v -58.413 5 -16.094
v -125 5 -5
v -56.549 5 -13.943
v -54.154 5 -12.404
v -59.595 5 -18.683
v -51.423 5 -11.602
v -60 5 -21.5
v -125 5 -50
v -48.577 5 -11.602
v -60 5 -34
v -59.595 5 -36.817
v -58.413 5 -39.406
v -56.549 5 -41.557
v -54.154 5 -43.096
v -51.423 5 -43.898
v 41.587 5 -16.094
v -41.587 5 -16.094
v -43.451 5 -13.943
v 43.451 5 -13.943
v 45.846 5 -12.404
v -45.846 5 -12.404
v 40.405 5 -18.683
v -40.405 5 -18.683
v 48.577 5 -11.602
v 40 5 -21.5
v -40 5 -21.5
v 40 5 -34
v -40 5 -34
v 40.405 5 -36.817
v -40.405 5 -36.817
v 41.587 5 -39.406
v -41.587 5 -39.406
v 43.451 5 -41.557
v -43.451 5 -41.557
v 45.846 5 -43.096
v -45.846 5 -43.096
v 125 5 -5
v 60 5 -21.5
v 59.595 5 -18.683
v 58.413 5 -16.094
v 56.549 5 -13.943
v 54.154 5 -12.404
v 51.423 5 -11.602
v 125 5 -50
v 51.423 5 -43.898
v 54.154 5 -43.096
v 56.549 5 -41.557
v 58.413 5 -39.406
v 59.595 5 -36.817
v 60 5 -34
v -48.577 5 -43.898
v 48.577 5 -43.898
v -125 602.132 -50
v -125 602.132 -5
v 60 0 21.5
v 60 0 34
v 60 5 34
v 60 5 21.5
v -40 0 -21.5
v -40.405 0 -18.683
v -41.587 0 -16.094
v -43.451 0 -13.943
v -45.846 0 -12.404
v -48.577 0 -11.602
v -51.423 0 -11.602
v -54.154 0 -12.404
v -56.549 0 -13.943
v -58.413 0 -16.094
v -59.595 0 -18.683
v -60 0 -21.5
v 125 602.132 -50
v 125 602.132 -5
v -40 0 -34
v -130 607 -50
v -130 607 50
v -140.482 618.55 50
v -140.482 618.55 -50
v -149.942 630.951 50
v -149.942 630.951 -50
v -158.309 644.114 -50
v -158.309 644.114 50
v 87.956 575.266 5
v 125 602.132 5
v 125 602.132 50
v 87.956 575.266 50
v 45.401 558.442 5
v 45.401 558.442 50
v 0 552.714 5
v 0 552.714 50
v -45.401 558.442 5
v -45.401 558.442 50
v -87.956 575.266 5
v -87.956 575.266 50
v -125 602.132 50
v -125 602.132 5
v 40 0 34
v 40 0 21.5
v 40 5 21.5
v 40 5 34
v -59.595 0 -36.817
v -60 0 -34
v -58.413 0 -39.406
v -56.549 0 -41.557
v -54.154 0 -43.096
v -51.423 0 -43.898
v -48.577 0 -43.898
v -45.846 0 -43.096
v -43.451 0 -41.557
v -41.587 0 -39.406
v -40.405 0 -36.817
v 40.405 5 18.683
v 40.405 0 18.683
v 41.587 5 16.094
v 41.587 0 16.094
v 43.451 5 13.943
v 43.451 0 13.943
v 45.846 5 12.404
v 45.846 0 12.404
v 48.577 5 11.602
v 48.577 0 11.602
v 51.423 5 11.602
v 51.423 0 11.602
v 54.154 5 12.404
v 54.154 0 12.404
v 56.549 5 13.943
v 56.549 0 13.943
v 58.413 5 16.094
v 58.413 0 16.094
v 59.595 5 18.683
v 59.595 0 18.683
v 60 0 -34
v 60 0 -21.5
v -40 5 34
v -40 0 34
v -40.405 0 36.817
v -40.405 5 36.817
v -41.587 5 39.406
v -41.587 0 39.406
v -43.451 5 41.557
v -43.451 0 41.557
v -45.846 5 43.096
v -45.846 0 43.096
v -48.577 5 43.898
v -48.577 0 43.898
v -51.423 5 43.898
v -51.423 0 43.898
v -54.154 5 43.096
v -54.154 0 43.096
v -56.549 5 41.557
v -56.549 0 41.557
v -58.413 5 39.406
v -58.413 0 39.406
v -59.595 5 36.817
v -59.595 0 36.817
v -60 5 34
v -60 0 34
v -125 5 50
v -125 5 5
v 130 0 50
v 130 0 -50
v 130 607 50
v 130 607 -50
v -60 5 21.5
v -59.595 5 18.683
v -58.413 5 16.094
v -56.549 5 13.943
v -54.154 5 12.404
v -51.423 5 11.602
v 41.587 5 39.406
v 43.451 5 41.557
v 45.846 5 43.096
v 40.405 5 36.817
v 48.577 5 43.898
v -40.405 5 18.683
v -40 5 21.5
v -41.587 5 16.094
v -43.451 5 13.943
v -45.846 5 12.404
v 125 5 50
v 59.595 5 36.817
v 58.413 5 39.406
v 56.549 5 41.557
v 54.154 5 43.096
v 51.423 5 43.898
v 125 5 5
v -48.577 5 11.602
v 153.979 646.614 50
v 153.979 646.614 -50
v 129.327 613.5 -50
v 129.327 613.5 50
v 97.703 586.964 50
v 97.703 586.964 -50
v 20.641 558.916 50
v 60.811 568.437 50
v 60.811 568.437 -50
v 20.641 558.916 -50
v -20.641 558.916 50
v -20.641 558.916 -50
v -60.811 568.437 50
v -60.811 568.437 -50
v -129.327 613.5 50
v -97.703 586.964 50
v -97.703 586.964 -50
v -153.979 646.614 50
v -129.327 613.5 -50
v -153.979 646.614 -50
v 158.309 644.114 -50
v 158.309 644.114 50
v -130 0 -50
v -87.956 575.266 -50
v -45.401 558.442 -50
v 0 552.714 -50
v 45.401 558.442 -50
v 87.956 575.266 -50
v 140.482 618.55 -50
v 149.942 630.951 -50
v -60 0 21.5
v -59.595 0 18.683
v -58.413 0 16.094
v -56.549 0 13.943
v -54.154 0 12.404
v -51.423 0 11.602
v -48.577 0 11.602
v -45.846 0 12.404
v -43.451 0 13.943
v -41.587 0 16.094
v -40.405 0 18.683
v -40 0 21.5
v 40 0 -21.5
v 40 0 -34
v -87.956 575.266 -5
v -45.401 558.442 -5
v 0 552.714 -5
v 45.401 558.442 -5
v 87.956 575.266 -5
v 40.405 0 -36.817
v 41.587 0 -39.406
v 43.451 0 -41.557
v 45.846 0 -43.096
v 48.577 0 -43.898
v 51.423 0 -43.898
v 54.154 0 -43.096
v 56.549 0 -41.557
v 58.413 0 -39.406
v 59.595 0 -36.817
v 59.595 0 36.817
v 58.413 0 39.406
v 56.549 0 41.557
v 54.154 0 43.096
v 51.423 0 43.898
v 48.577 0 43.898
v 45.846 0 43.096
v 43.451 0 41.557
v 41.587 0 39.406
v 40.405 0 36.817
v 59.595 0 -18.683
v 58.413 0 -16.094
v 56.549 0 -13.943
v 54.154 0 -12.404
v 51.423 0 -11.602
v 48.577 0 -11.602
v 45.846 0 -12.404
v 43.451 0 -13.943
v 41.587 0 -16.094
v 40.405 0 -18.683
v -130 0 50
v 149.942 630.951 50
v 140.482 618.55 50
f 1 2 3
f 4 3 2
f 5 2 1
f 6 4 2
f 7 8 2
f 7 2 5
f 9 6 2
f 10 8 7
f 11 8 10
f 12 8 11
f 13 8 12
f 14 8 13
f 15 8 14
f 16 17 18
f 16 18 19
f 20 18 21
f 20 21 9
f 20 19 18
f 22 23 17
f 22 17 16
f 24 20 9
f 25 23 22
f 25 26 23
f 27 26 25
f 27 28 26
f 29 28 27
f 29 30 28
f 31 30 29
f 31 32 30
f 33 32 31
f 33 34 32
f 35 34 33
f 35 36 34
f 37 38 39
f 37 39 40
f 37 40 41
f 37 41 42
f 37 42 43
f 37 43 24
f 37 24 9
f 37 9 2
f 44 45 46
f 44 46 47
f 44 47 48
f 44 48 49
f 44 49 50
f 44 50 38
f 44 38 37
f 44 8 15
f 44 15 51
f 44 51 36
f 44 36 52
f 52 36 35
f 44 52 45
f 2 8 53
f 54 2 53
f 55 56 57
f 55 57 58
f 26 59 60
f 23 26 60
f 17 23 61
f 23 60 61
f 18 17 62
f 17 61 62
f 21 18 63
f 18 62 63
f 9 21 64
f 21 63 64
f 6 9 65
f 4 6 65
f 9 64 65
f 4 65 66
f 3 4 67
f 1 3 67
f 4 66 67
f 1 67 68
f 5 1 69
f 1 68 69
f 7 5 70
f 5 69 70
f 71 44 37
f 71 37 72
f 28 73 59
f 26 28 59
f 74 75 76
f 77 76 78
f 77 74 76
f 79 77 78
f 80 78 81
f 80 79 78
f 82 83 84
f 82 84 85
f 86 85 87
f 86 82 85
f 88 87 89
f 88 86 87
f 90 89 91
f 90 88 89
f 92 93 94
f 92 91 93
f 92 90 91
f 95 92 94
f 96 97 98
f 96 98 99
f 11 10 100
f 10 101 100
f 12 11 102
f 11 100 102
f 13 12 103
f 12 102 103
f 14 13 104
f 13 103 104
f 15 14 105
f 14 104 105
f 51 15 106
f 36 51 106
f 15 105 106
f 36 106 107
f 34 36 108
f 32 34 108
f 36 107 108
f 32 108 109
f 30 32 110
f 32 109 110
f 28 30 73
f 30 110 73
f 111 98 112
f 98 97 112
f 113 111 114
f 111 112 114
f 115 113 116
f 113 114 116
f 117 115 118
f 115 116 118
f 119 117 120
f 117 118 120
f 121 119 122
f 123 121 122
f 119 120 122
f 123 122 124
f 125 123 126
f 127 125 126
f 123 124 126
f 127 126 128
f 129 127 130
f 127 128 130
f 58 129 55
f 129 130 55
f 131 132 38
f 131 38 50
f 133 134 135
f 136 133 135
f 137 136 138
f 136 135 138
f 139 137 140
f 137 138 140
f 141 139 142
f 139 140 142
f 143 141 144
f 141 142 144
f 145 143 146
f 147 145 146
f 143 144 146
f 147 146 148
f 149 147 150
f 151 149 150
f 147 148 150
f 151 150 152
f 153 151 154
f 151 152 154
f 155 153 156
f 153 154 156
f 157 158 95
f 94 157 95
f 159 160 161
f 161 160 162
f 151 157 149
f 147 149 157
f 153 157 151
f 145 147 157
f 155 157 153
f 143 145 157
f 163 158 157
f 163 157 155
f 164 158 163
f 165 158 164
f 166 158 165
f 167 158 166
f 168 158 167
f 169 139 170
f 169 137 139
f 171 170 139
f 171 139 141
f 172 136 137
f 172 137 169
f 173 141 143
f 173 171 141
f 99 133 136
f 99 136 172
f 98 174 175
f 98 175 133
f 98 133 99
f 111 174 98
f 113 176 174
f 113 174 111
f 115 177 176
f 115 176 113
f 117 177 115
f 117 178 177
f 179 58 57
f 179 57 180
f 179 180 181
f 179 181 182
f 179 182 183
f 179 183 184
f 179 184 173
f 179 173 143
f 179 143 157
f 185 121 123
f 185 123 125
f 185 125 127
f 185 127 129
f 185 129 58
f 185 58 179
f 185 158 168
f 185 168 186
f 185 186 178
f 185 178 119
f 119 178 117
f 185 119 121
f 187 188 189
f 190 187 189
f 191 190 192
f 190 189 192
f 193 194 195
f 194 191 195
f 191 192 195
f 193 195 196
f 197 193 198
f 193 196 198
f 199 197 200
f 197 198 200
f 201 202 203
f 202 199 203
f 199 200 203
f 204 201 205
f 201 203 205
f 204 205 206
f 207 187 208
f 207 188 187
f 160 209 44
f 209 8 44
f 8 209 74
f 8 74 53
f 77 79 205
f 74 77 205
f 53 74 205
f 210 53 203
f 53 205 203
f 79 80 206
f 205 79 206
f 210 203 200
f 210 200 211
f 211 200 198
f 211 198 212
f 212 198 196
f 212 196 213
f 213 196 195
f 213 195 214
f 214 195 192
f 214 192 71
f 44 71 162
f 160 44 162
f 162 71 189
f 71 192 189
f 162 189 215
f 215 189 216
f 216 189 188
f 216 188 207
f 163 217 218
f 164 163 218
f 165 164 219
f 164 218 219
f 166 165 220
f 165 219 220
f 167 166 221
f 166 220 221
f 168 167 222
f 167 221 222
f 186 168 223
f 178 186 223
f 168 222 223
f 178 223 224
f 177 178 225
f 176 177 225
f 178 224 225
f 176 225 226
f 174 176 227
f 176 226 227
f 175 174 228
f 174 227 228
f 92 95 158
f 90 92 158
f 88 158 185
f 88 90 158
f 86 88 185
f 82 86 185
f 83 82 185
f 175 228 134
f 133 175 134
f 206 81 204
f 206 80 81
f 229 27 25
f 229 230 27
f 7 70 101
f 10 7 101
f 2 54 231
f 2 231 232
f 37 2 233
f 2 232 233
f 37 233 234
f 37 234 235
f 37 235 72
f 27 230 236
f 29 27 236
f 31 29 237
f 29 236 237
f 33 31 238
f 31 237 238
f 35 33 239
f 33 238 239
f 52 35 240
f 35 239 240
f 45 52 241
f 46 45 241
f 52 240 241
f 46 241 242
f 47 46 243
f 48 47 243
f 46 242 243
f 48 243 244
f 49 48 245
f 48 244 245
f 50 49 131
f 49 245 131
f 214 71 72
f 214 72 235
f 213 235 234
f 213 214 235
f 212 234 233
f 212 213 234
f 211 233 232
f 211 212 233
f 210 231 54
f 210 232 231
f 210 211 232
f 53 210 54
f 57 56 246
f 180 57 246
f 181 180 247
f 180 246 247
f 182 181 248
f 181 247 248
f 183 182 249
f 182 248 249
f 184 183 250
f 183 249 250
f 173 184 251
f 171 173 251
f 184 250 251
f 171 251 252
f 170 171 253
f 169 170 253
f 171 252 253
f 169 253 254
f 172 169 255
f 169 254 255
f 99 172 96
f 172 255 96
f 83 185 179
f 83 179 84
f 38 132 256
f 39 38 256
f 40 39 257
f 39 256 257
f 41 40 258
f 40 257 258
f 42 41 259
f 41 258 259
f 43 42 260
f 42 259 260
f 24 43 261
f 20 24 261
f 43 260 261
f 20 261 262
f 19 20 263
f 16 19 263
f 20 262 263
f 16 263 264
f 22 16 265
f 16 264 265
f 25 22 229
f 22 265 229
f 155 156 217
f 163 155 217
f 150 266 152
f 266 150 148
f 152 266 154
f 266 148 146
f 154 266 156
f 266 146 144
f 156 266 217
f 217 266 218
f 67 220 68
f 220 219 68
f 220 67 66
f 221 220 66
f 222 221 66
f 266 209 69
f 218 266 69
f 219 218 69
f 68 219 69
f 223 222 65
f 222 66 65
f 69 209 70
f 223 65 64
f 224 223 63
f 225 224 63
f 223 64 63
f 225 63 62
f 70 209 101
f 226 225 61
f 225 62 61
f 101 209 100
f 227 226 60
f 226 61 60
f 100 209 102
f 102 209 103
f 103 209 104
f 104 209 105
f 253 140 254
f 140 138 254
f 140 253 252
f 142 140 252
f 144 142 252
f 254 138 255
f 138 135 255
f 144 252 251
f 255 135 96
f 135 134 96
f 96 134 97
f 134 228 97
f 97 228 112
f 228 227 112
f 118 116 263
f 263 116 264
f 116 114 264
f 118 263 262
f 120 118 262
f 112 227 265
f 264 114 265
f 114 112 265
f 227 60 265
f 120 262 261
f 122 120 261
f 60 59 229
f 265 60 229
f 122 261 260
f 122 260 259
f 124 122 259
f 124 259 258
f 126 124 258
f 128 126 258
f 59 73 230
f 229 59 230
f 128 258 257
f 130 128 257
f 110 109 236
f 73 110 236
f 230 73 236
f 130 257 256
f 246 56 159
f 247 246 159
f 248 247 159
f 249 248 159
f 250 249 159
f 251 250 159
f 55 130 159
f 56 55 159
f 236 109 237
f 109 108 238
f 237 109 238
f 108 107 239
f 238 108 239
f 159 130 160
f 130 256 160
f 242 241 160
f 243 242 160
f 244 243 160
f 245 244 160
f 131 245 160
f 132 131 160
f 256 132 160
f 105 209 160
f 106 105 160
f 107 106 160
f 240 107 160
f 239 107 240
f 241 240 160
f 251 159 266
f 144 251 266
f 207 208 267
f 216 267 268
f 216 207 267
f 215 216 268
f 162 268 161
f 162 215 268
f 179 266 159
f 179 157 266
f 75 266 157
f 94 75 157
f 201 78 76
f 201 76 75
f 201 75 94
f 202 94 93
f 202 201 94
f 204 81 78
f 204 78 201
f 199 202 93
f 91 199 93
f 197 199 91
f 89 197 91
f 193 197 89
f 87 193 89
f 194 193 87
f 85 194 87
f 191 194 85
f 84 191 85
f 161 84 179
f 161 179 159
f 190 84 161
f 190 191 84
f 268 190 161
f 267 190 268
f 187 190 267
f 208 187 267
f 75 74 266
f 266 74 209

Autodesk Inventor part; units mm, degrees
ref_plane "YZ Plane" through (0, 0, 0) normal (1, 0, 0) x (0, 1, 0)
ref_plane "XZ Plane" through (0, 0, 0) normal (0, 1, 0) x (-1, 0, 0)
ref_plane "XY Plane" through (0, 0, 0) normal (0, 0, 1) x (1, 0, 0)
sketch "Sketch1" plane through (0, 0, 0) normal (0, 0, 1) x (1, 0, 0)
  line L0 (-130, 607) -> (-130, 0)
  line L1 (-130, 0) -> (130, 0)
  line L2 (130, 0) -> (130, 607)
  line L3 (125, 5) -> (125, 602.1317)
  line L4 (-125, 5) -> (-125, 602.1317)
  line L5 (-125, 5) -> (125, 5)
  arc A0 (-153.9793, 646.614) -> (153.9793, 646.614) centre (0, 735.514) ccw
  arc A1 (130, 607) -> (158.3094, 644.114) centre (0, 735.514) ccw
  arc A2 (-158.3094, 644.114) -> (-130, 607) centre (0, 735.514) ccw
  arc A3 (-125, 602.1317) -> (125, 602.1317) centre (0, 735.514) ccw
  line L6 (-158.3094, 644.114) -> (-153.9793, 646.614)
  line L7 (153.9793, 646.614) -> (158.3094, 644.114)
  point P0 (0, 0)
  point P1 (0, 0)
  point P2 (0, 5)
  dimension "d0" = 260
  dimension "d2" = 607
  dimension "d3" = 607
  dimension "d6" = 5
  dimension "d7" = 5
  dimension "d8" = 5
  dimension "d57" = 355.6
  dimension "d61" = 5
  dimension "d64" = 182.8
  dimension "d79" = 130
  dimension "d80" = 120
  dimension "d81" = 158.3094
  dimension "d82" = 153.9793
  dimension "d83" = 153.9793
extrude "Extrusion1" add sketch "Sketch1" along normal mid plane 100
sketch "Sketch5" plane through (0, 0, 0) normal (0, 0, 1) x (1, 0, 0)
  line L0 (-125, 602.1317) -> (-125, 5) projected
  line L1 (-125, 602.1317) -> (-125, 5)
  line L2 (-125, 5) -> (125, 5)
  line L3 (-125, 5) -> (125, 5) projected
  line L4 (125, 5) -> (125, 602.1317) projected
  line L5 (125, 5) -> (125, 602.1317)
  arc A0 (-125, 602.1317) -> (125, 602.1317) centre (0, 735.514) ccw
  point P0 (0, 0)
  point P1 (0, 5)
  dimension "d67" = 365.6
extrude "Extrusion2" add sketch "Sketch5" along normal mid plane 10
sketch "Sketch6" plane through (-130, 0, 50) normal (0, -1, 0) x (1, 0, 0)
  line L0 (5, -100) -> (255, -100) projected
  line L1 (130, -100) -> (130, 0)
  line L2 (0, 0) -> (260, 0) projected
  line L3 (80, -16) -> (80, -28.5) construction
  line L4 (70, -16) -> (70, -28.5)
  line L5 (90, -28.5) -> (90, -16)
  arc A0 (90, -16) -> (70, -16) centre (80, -16) ccw
  arc A1 (70, -28.5) -> (90, -28.5) centre (80, -28.5) ccw
  line L6 (80, -71.5) -> (80, -84) construction
  line L7 (70, -71.5) -> (70, -84)
  line L8 (90, -84) -> (90, -71.5)
  arc A2 (90, -71.5) -> (70, -71.5) centre (80, -71.5) ccw
  arc A3 (70, -84) -> (90, -84) centre (80, -84) ccw
  line L9 (180, -16) -> (180, -28.5) construction
  line L10 (190, -16) -> (190, -28.5)
  line L11 (170, -28.5) -> (170, -16)
  arc A4 (190, -16) -> (170, -16) centre (180, -16) ccw
  arc A5 (170, -28.5) -> (190, -28.5) centre (180, -28.5) ccw
  line L12 (180, -71.5) -> (180, -84) construction
  line L13 (190, -71.5) -> (190, -84)
  line L14 (170, -84) -> (170, -71.5)
  arc A6 (190, -71.5) -> (170, -71.5) centre (180, -71.5) ccw
  arc A7 (170, -84) -> (190, -84) centre (180, -84) ccw
  point P0 (130, -50)
  point P1 (80, -22.25)
  point P2 (80, -77.75)
  point P3 (180, -22.25)
  point P4 (180, -77.75)
  dimension "d88" = 100
  dimension "d89" = 10
  dimension "d90" = 100
  dimension "d92" = 10
  dimension "d93" = 68
  dimension "d94" = 16
  dimension "d95" = 43
  dimension "d96" = 12.5
extrude "Extrusion5" cut sketch "Sketch6" against normal blind 10
properties part number "Fix Saddle new 1" material "Steel ASTM A36"
